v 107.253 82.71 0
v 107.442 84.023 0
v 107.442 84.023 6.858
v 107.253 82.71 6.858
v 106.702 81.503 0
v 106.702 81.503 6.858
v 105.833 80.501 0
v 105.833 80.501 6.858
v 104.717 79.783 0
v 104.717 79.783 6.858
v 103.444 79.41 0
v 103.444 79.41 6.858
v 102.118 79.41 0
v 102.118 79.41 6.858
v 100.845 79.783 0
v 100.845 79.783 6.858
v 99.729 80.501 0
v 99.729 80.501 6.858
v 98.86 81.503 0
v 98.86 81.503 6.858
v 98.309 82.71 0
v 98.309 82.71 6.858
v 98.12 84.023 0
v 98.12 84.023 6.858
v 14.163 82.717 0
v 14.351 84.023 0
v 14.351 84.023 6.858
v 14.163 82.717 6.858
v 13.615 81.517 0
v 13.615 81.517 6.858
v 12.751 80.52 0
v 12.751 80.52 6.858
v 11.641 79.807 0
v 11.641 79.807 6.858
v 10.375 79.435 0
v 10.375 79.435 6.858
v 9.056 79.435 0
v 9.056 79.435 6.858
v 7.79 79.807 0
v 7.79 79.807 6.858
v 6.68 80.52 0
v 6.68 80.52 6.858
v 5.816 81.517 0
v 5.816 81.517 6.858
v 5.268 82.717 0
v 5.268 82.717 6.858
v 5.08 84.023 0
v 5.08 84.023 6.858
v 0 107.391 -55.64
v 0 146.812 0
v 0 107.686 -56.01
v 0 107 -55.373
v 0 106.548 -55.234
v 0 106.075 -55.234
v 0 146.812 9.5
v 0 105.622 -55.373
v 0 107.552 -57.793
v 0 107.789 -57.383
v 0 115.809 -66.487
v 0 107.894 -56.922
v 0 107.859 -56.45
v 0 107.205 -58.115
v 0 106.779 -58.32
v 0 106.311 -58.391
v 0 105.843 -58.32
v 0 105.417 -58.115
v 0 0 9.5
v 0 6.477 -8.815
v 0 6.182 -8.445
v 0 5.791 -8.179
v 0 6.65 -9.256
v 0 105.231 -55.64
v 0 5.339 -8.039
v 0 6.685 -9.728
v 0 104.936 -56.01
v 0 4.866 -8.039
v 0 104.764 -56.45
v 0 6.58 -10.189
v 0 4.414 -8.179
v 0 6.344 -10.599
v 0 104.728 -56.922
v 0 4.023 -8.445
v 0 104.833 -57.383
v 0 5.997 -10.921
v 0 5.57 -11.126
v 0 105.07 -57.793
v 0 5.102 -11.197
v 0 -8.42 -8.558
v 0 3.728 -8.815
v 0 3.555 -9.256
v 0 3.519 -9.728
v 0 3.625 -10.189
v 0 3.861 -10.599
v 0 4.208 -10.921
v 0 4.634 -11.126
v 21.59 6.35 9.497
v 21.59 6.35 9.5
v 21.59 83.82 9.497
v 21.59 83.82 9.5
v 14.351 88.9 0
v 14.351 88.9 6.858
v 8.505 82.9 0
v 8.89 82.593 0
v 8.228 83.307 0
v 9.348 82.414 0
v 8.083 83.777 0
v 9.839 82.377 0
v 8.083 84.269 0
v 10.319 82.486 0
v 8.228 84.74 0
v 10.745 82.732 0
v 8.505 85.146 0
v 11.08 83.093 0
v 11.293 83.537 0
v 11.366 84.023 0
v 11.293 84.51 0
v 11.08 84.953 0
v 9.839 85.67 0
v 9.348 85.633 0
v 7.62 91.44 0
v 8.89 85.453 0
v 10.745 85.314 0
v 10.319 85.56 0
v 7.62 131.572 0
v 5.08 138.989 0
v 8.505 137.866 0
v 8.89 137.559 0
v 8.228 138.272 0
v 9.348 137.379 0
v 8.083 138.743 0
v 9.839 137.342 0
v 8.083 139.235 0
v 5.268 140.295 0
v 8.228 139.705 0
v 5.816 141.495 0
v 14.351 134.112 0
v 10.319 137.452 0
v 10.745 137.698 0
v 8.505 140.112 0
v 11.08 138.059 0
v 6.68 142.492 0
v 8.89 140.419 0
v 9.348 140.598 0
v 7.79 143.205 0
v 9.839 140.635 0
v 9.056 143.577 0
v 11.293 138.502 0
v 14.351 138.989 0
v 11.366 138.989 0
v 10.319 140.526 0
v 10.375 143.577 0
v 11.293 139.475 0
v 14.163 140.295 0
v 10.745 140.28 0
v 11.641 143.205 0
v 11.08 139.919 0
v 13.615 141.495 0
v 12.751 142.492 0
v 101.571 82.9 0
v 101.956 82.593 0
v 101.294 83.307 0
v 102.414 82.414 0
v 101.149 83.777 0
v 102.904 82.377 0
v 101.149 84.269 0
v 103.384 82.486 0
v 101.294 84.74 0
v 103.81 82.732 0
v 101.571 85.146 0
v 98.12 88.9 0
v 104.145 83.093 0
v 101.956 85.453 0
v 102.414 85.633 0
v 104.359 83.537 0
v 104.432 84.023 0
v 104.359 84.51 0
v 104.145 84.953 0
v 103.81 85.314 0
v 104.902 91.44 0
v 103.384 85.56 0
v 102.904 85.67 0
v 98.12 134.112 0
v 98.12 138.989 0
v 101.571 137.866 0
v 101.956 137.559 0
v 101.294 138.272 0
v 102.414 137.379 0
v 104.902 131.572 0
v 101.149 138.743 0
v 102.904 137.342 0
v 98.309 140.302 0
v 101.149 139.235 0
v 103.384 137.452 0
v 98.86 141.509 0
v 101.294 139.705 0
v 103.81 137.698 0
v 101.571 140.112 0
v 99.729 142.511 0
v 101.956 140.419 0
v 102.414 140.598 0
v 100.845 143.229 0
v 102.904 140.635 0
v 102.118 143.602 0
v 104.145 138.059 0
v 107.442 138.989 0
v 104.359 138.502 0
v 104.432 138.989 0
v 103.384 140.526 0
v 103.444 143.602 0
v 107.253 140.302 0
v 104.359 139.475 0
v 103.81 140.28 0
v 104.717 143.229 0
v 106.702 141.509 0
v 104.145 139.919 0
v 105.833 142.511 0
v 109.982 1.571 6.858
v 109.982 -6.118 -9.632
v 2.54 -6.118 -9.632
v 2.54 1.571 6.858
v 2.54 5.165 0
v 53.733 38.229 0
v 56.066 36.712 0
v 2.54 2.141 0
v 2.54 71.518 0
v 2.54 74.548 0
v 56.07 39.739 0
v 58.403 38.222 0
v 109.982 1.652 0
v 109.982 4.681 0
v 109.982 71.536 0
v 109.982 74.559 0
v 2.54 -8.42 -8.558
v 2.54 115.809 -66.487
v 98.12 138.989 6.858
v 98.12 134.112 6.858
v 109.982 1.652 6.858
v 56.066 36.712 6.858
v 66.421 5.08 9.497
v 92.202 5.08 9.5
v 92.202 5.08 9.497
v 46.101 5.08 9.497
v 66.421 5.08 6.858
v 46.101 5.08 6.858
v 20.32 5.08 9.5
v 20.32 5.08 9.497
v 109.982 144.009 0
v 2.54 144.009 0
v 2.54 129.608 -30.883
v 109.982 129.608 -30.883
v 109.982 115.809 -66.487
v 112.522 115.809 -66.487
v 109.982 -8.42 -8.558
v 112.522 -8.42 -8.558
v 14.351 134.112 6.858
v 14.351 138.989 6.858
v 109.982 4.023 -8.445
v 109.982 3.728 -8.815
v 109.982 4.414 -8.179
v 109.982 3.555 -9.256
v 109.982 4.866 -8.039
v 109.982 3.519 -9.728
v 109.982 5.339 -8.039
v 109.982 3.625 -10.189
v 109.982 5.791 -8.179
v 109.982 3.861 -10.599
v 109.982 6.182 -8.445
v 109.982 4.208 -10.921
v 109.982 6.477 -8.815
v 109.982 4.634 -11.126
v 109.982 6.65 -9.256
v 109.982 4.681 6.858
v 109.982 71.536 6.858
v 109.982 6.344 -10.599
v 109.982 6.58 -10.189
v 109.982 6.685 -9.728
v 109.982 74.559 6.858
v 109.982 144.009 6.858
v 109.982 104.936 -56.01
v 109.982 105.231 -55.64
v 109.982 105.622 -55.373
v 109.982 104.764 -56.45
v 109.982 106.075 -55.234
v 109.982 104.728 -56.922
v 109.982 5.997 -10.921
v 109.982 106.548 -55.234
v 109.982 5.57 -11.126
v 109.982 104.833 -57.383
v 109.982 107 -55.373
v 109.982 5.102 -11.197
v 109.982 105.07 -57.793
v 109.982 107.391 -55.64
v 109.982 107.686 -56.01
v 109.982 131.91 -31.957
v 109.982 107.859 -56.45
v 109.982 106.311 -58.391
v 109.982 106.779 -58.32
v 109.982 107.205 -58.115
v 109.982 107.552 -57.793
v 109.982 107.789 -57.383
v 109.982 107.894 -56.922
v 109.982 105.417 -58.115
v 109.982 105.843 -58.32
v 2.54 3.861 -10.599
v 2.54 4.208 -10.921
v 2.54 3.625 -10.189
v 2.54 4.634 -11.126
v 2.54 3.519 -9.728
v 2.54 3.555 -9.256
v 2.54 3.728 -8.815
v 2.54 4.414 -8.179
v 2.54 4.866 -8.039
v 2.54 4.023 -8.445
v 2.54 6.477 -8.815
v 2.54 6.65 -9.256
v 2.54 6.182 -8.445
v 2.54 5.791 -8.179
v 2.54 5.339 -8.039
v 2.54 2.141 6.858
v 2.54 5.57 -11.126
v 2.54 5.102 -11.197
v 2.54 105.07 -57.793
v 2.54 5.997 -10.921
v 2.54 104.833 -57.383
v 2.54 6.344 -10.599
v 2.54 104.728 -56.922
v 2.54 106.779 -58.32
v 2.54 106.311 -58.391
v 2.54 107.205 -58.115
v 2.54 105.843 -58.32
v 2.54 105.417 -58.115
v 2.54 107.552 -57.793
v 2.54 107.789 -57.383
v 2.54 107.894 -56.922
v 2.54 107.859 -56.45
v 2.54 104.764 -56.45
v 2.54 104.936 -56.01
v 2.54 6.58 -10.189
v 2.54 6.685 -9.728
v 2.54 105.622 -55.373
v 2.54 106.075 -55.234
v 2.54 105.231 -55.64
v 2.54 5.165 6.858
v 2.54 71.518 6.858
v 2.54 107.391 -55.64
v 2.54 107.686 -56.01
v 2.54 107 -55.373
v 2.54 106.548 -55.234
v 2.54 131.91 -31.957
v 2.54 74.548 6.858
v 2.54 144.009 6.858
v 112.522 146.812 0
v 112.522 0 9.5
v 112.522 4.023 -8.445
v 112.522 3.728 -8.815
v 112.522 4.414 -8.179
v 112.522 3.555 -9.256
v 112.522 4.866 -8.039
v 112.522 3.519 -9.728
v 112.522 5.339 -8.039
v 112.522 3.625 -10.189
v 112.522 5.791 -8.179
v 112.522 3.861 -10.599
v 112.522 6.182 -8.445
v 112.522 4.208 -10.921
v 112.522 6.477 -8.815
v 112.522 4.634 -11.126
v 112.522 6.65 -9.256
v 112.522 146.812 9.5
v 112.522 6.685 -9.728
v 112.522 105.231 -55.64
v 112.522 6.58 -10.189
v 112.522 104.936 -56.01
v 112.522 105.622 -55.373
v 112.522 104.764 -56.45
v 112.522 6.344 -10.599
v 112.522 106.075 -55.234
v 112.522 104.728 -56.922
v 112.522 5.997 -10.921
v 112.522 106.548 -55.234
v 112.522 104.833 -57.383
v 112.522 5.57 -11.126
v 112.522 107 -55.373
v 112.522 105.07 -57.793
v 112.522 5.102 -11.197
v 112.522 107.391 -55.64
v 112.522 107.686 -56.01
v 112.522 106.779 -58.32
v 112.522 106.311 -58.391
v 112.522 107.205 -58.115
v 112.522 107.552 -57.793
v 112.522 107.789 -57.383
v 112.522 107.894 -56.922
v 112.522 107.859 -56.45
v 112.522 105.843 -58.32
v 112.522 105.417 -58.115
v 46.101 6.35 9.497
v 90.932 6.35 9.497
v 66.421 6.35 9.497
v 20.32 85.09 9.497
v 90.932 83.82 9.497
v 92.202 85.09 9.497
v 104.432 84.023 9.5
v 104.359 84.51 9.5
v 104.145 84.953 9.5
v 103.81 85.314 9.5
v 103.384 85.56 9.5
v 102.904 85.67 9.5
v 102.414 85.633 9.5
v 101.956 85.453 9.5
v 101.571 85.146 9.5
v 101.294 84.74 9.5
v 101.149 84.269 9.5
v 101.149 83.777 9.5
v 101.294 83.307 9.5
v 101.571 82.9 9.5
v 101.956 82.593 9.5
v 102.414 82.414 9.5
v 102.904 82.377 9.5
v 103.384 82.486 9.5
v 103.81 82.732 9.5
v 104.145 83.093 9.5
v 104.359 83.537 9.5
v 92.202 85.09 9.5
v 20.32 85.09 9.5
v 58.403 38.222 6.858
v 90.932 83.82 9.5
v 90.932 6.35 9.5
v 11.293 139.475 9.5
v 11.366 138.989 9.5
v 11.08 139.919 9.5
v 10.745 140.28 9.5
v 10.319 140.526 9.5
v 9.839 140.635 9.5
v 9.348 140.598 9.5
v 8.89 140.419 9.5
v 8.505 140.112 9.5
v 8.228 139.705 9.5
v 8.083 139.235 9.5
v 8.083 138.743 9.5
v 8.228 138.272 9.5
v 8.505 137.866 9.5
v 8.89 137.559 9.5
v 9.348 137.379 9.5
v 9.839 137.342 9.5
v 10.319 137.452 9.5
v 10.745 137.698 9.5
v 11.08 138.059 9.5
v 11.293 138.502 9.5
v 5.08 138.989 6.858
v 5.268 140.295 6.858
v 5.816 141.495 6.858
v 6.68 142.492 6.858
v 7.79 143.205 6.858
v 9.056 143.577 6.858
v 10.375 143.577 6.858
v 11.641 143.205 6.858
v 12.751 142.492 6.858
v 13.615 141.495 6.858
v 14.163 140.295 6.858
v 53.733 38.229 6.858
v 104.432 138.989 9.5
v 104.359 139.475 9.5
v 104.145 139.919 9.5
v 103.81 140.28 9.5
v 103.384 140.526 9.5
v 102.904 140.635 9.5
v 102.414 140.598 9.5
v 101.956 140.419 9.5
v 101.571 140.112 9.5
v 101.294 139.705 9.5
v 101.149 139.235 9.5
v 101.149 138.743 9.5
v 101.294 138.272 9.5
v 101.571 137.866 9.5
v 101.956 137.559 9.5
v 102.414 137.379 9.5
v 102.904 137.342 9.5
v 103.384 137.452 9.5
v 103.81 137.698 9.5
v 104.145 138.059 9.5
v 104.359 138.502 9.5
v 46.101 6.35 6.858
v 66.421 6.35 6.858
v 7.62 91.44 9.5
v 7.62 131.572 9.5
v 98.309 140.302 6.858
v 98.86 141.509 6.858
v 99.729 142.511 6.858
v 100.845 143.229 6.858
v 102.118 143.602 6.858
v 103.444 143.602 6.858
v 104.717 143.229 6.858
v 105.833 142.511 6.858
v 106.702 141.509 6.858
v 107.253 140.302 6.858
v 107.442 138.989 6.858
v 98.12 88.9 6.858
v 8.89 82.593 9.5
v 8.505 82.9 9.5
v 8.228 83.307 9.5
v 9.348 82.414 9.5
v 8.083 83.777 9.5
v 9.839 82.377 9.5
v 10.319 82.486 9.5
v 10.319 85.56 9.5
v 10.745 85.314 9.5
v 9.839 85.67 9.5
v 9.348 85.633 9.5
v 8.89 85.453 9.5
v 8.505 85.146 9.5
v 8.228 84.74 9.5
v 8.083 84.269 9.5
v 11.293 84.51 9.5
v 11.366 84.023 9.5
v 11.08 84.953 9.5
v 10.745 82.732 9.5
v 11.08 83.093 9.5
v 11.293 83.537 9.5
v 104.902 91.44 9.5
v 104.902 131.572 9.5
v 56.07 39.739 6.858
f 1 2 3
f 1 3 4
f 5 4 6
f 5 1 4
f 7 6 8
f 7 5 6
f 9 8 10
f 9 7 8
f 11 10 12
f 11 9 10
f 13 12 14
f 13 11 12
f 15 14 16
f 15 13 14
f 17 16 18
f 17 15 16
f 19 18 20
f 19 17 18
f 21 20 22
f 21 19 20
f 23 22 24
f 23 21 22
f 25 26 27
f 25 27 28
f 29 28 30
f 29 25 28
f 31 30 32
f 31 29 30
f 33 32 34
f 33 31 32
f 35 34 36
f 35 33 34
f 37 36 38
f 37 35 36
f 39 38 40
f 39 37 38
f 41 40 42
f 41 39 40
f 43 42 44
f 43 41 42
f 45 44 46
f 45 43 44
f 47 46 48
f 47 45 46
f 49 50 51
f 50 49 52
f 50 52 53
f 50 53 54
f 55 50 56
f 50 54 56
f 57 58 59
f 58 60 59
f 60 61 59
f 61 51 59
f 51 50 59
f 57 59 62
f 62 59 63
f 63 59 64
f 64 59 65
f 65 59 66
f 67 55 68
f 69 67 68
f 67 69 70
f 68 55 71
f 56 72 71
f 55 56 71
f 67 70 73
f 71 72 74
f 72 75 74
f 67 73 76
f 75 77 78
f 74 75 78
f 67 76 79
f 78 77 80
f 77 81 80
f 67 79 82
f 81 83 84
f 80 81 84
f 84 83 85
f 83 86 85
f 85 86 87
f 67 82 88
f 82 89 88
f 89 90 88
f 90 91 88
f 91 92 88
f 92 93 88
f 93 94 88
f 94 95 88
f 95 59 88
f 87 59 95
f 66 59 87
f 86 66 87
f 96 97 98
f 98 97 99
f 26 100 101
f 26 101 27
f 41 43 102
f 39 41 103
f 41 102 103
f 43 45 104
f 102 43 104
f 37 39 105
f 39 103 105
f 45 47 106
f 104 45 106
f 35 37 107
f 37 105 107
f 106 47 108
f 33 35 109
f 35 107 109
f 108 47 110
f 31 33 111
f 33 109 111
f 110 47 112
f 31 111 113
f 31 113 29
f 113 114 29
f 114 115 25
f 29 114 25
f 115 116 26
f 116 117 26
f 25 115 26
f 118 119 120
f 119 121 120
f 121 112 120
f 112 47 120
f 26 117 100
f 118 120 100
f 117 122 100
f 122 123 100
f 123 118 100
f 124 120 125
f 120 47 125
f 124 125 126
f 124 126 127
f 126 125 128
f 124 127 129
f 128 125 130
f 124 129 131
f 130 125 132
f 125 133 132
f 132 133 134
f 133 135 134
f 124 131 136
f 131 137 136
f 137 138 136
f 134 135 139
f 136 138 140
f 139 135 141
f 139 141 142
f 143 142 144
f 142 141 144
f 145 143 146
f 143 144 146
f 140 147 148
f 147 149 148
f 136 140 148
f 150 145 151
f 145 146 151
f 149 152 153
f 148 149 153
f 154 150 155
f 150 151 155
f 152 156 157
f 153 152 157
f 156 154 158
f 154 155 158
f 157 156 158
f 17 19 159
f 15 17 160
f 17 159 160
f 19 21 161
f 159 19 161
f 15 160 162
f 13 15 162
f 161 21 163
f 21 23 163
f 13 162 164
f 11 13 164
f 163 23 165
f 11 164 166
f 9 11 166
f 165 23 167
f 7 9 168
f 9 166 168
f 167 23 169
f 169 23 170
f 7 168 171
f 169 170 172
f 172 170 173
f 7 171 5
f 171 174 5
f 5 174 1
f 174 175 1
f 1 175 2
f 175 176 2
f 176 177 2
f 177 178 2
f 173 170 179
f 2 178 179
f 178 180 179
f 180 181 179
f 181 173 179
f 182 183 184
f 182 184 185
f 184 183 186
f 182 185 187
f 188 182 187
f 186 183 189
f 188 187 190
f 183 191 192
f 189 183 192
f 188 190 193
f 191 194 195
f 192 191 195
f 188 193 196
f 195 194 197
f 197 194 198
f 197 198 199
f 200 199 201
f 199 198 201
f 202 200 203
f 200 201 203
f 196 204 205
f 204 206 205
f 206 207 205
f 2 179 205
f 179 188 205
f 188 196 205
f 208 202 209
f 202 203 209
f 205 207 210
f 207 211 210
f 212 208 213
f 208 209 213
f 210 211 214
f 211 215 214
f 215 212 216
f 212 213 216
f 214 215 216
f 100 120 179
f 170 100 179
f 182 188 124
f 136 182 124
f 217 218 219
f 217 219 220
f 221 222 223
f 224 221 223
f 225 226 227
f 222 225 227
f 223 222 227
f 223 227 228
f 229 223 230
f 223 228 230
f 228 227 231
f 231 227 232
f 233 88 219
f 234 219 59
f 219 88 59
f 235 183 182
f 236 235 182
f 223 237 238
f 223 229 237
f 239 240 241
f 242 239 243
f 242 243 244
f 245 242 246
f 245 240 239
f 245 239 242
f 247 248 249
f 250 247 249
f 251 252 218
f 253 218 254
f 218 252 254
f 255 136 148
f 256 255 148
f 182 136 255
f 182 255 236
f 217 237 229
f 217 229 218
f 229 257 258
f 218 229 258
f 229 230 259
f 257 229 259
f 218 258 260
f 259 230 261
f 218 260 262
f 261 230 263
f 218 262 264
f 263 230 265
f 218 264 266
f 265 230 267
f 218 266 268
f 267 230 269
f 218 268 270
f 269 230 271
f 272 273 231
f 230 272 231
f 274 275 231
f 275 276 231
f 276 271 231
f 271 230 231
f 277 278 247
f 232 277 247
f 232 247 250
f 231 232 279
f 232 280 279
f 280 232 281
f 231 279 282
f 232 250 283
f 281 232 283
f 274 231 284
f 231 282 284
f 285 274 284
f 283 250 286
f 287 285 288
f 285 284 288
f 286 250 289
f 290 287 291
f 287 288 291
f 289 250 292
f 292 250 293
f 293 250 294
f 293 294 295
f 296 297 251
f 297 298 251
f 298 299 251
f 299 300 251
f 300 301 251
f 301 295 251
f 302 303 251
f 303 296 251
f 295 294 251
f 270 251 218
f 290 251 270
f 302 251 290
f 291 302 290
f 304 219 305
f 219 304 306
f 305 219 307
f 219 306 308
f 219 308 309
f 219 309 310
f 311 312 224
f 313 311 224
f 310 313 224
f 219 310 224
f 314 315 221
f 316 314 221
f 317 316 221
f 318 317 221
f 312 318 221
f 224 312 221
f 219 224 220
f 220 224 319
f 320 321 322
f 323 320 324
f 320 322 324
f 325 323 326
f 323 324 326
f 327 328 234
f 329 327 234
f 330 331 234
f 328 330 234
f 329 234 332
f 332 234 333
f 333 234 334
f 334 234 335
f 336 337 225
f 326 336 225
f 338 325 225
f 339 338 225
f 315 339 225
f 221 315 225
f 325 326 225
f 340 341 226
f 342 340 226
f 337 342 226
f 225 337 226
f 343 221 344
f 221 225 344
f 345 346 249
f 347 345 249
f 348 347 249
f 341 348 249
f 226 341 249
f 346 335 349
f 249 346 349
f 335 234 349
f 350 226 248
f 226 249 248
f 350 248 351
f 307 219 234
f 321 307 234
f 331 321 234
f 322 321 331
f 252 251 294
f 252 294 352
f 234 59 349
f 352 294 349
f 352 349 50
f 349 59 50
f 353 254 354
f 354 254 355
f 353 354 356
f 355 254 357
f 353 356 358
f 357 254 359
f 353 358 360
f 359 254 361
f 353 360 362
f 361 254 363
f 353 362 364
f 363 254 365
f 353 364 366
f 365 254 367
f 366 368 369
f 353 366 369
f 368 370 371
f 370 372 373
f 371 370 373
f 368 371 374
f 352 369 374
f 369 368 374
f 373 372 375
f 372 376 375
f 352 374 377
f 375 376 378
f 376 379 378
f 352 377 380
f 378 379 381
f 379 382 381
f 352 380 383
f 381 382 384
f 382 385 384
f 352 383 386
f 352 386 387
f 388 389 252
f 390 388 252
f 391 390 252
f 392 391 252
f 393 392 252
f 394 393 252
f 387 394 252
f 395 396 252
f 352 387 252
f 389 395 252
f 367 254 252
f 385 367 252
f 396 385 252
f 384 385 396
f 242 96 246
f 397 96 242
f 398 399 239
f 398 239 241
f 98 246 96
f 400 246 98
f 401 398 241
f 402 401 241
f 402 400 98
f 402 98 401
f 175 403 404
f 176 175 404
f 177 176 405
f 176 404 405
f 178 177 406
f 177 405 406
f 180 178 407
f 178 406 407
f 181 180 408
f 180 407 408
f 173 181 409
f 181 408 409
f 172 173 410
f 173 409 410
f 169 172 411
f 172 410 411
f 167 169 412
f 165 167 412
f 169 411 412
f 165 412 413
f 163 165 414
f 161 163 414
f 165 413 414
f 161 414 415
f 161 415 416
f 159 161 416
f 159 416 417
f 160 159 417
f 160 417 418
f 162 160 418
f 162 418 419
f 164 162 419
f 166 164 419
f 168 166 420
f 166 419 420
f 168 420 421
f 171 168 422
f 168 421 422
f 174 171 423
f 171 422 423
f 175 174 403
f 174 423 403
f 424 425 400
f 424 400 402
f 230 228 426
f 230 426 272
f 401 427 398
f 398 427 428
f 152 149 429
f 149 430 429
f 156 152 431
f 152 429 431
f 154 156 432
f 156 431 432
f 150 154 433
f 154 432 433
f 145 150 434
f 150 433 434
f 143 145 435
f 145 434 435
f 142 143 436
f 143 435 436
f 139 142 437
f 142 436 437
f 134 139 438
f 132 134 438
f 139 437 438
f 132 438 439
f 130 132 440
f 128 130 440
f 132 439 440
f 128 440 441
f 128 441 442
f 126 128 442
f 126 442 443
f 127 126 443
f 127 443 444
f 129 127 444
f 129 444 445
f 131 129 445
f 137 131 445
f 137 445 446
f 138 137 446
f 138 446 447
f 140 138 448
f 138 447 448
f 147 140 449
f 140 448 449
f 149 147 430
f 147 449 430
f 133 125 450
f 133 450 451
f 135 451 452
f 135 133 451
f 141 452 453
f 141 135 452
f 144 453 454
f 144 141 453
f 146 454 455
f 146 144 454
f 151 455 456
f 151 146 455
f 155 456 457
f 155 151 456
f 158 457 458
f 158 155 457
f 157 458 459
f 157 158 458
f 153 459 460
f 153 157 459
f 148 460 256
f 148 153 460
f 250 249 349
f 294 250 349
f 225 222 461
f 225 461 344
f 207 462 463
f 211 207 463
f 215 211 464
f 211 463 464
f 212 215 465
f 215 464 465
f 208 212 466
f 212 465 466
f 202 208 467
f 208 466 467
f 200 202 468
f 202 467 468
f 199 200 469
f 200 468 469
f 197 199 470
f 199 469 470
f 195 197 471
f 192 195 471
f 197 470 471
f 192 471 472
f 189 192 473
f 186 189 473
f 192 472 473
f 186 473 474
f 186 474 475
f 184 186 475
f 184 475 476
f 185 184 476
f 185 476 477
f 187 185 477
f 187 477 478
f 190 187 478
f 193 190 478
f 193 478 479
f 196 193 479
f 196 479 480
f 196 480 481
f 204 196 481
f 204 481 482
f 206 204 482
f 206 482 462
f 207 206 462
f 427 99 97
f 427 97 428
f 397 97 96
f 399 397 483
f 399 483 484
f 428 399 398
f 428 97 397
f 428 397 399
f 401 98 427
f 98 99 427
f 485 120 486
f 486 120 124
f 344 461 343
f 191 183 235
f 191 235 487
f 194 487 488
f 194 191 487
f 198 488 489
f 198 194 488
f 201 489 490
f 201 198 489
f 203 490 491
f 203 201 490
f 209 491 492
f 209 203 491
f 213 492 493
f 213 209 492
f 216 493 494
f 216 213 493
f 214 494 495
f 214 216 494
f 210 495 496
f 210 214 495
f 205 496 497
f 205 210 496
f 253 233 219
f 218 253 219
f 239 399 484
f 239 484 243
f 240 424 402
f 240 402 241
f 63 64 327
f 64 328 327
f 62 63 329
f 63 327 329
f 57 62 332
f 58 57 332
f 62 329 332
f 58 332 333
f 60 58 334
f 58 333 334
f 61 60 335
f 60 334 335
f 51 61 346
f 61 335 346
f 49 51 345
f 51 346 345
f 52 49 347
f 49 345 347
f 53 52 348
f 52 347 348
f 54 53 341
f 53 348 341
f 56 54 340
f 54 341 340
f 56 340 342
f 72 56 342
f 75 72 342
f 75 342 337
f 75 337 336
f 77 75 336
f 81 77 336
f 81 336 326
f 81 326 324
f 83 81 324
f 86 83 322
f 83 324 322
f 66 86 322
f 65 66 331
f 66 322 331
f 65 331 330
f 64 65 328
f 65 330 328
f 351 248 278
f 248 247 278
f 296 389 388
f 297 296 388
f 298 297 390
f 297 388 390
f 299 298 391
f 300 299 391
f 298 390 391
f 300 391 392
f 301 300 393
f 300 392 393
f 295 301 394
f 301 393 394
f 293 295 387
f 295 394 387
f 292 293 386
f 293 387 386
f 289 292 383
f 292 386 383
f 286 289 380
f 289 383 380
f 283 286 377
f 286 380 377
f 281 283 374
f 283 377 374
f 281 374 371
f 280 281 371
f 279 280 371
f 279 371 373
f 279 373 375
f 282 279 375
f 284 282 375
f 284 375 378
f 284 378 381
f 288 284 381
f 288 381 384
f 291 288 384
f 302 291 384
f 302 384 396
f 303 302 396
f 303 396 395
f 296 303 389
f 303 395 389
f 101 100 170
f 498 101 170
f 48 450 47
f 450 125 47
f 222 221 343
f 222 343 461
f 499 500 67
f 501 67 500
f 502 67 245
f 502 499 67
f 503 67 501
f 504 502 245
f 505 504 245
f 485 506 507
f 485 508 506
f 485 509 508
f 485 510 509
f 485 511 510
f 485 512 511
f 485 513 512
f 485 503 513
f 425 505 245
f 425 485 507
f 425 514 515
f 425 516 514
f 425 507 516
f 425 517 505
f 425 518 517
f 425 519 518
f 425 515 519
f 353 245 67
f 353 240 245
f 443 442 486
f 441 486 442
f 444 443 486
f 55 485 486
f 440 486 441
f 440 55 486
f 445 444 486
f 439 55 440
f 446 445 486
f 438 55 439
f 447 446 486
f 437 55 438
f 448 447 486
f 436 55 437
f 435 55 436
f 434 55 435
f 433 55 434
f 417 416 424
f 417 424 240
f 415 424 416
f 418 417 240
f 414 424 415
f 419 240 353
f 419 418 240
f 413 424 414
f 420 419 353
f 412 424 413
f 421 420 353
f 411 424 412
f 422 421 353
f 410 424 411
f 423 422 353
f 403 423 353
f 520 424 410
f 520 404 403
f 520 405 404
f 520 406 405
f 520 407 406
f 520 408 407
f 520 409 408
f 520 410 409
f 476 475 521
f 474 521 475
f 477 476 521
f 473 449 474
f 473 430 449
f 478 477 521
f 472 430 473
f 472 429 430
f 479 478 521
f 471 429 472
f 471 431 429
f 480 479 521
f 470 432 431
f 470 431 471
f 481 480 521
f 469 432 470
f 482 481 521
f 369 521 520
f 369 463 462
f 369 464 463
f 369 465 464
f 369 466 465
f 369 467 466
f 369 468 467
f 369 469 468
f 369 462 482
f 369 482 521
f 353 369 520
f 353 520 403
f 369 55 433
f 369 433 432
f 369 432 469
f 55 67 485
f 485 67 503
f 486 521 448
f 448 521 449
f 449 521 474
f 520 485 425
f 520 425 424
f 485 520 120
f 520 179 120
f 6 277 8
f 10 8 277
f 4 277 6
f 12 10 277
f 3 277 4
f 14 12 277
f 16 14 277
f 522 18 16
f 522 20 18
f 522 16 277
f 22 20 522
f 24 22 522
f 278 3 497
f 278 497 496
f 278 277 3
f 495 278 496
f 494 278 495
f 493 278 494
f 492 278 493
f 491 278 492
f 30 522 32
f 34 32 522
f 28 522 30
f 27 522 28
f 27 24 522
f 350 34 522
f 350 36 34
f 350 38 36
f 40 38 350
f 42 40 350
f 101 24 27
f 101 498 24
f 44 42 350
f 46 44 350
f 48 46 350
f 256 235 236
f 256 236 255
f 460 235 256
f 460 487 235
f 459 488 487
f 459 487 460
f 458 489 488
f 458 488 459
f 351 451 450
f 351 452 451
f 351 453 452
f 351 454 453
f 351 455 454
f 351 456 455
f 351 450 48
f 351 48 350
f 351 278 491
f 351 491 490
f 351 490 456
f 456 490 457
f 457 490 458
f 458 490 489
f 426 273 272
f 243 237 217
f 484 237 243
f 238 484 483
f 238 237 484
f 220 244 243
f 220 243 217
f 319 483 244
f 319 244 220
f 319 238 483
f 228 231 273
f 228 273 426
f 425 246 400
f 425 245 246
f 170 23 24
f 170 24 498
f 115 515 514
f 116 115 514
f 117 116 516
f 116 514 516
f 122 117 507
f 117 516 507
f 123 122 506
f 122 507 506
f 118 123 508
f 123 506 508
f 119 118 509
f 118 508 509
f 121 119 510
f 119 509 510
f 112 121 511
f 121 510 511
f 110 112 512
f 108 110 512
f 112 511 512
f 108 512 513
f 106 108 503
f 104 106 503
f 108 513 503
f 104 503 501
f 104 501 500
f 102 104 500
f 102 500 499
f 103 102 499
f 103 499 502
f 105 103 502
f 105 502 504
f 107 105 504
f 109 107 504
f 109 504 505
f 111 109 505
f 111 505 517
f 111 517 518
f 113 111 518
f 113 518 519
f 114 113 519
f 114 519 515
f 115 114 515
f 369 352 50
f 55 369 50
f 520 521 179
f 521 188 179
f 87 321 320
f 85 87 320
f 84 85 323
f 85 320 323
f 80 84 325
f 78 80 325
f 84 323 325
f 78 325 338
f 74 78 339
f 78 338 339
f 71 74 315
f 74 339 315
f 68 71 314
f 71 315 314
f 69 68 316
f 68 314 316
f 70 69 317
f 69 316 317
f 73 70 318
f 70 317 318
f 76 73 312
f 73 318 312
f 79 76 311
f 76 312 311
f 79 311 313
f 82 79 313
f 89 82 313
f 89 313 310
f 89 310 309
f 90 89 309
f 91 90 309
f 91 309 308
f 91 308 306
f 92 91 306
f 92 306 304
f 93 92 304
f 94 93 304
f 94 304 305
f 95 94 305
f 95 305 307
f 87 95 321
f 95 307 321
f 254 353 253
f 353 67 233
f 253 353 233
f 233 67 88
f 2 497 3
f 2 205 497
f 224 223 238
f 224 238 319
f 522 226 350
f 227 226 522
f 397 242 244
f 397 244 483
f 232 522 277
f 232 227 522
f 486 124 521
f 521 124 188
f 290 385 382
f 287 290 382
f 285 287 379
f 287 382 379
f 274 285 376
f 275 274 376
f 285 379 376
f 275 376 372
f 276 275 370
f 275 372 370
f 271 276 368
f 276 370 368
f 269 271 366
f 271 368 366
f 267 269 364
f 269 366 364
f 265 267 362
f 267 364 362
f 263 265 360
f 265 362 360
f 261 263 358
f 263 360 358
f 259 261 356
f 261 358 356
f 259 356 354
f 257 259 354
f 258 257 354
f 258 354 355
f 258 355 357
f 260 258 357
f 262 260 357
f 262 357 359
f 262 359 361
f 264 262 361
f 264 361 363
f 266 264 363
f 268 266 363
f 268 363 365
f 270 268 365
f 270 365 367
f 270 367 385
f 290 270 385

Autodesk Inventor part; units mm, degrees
ref_plane "YZ Plane" through (0, 0, 0) normal (1, 0, 0) x (0, 1, 0)
ref_plane "XZ Plane" through (0, 0, 0) normal (0, 1, 0) x (-1, 0, 0)
ref_plane "XY Plane" through (0, 0, 0) normal (0, 0, 1) x (1, 0, 0)
sketch "Sketch1" plane through (0, 0, 0) normal (0, 0, 1) x (1, 0, 0)
  line L0 (0, 0) -> (112.522, 0)
  line L1 (112.522, 0) -> (112.522, 146.812)
  line L2 (112.522, 146.812) -> (0, 146.812)
  line L3 (0, 146.812) -> (0, 0)
  line L4 (7.62, 131.572) -> (104.902, 131.572)
  line L5 (104.902, 131.572) -> (104.902, 91.44)
  line L6 (104.902, 91.44) -> (7.62, 91.44)
  line L7 (7.62, 91.44) -> (7.62, 131.572)
  line L8 (21.59, 83.82) -> (90.932, 83.82)
  line L9 (90.932, 83.82) -> (90.932, 6.35)
  line L10 (90.932, 6.35) -> (21.59, 6.35)
  line L11 (21.59, 6.35) -> (21.59, 83.82)
  dimension "d0" = 97.282
  dimension "d1" = 40.132
  dimension "d2" = 69.342
  dimension "d3" = 77.47
  dimension "d4" = 6.35
  dimension "d5" = 21.59
  dimension "d6" = 7.62
  dimension "d7" = 7.62
  dimension "d8" = 15.24
  dimension "d9" = 7.62
extrude "Extrusion1" add sketch "Sketch1" along normal blind 9.4996 contours L3 L2 L1 L0 | L8 L9 L10 L11
sketch "Sketch2" plane through (0, 0, 9.4996) normal (0, 0, 1) x (1, 0, 0)
  line L0 (0, 0) -> (112.522, 0)
  line L1 (112.522, 0) -> (112.522, 139.192)
  line L2 (112.522, 139.192) -> (0, 139.192)
  line L3 (0, 139.192) -> (0, 0)
  line L4 (7.62, 131.572) -> (104.902, 131.572)
  line L5 (104.902, 131.572) -> (104.902, 91.44)
  line L6 (104.902, 91.44) -> (7.62, 91.44)
  line L7 (7.62, 91.44) -> (7.62, 131.572)
  line L8 (21.59, 83.82) -> (90.932, 83.82)
  line L9 (90.932, 83.82) -> (90.932, 6.35)
  line L10 (90.932, 6.35) -> (21.59, 6.35)
  line L11 (21.59, 6.35) -> (21.59, 83.82)
  line L12 (20.32, 85.09) -> (92.202, 85.09)
  line L13 (92.202, 85.09) -> (92.202, 5.08)
  line L14 (92.202, 5.08) -> (20.32, 5.08)
  line L15 (20.32, 5.08) -> (20.32, 85.09)
  dimension "d12" = 97.282
  dimension "d13" = 40.132
  dimension "d14" = 69.342
  dimension "d15" = 77.47
  dimension "d16" = 6.35
  dimension "d17" = 21.59
  dimension "d18" = 7.62
  dimension "d19" = 7.62
  dimension "d20" = 7.62
  dimension "d21" = 7.62
  dimension "d33" = 1.27
  dimension "d34" = 1.27
  dimension "d35" = 1.27
  dimension "d36" = 1.27
extrude "Extrusion2" cut sketch "Sketch2" against normal blind 0.0025 contours L12 L13 L14 L15
sketch "Sketch3" plane through (0, 0, 9.4996) normal (0, 0, 1) x (1, 0, 0)
  circle A0 centre (9.7155, 138.9888) radius 1.651
  circle A1 centre (102.7811, 138.9888) radius 1.651
  circle A2 centre (102.7811, 84.0232) radius 1.651
  circle A3 centre (9.7155, 84.0232) radius 1.651
  line L0 (104.902, 131.572) -> (104.902, 91.44)
  line L1 (104.902, 91.44) -> (7.62, 91.44)
  line L2 (21.59, 6.35) -> (90.932, 6.35)
  line L3 (92.202, 5.08) -> (20.32, 5.08)
  line L4 (46.101, 6.35) -> (66.421, 6.35)
  line L5 (66.421, 6.35) -> (66.421, 5.08)
  line L6 (66.421, 5.08) -> (46.101, 5.08)
  line L7 (46.101, 5.08) -> (46.101, 6.35)
  line L8 (21.59, 83.82) -> (21.59, 6.35)
  line L9 (90.932, 6.35) -> (90.932, 83.82)
  point P0 (0, 0)
  dimension "d24" = 3.302
  dimension "d25" = 93.0656
  dimension "d26" = 93.0656
  dimension "d27" = 0
  dimension "d28" = 54.9656
  dimension "d29" = 2.1209
  dimension "d30" = 0
  dimension "d31" = 7.4168
  dimension "d32" = 0
  dimension "d37" = 20.32
  dimension "d38" = 24.511
  dimension "d39" = 24.511
extrude "Extrusion3" cut sketch "Sketch3" against normal through all
sketch "Sketch10" plane through (0, 0, 0) normal (0, 0, -1) x (-1, 0, 0)
  line L0 (12.7738, 184.0109) -> (-117.8029, 184.0109)
  line L1 (-117.8029, 184.0109) -> (-117.8029, -18.4511)
  line L2 (-117.8029, -18.4511) -> (12.7738, -18.4511)
  line L3 (12.7738, -18.4511) -> (12.7738, 184.0109)
  line L4 (-5.08, 138.9888) -> (-5.08, 84.0232)
  line L5 (-14.351, 134.112) -> (-98.1202, 134.112)
  line L6 (-107.442, 138.9888) -> (-107.442, 84.0232)
  line L7 (-112.522, 0) -> (-112.522, 146.812)
  line L8 (-14.351, 88.9) -> (-98.1202, 88.9)
  arc A0 (-5.08, 138.9888) -> (-14.351, 138.9888) centre (-9.7155, 138.9888) ccw
  arc A1 (-14.351, 84.0232) -> (-5.08, 84.0232) centre (-9.7155, 84.0232) ccw
  arc A2 (-107.442, 84.0232) -> (-98.1202, 84.0232) centre (-102.7811, 84.0232) ccw
  arc A3 (-98.1202, 138.9888) -> (-107.442, 138.9888) centre (-102.7811, 138.9888) ccw
  circle A4 centre (-9.7155, 84.0232) radius 1.651
  circle A5 centre (-9.7155, 138.9888) radius 1.651
  circle A6 centre (-102.7811, 138.9888) radius 1.651
  circle A7 centre (-102.7811, 84.0232) radius 1.651
  line L9 (-14.351, 134.112) -> (-14.351, 138.9888)
  line L10 (-98.1202, 138.9888) -> (-98.1202, 134.112)
  line L11 (-7.62, 131.572) -> (-7.62, 91.44)
  line L12 (-7.62, 131.572) -> (-104.902, 131.572)
  line L13 (-7.62, 91.44) -> (-104.902, 91.44)
  line L14 (-104.902, 131.572) -> (-104.902, 91.44)
  line L15 (-98.1202, 84.0232) -> (-98.1202, 88.9)
  line L16 (-14.351, 88.9) -> (-14.351, 84.0232)
  line L17 (0, 76.2) -> (-112.5015, 3.0431)
  line L18 (-112.5015, 3.0431) -> (-112.522, 0)
  line L19 (-112.522, 0) -> (1.3847, 74.0706)
  line L20 (1.3847, 74.0706) -> (0, 76.2)
  line L21 (1.524, 2.54) -> (-112.522, 76.2)
  line L22 (-112.522, 76.2) -> (-114.4017, 74.3903)
  line L23 (-114.4017, 74.3903) -> (0.1459, 0.4063)
  line L24 (0.1459, 0.4063) -> (1.524, 2.54)
  line L25 (0, 0) -> (-112.522, 0)
  line L26 (0, 146.812) -> (0, 0)
  point P0 (-14.351, 136.5504)
  dimension "d64" = 2.54
  dimension "d65" = 2.54
  dimension "d66" = 2.54
  dimension "d67" = 2.54
  dimension "d68" = 2.54
  dimension "d69" = 2.54
  dimension "d70" = 2.54
  dimension "d71" = 1.524
  dimension "d72" = 76.2
  dimension "d73" = 0
  dimension "d74" = 76.2
  dimension "d75" = 0
  dimension "d76" = 0
  dimension "d77" = 0
extrude "Extrusion8" cut sketch "Sketch10" against normal blind 6.858 contours L3 L2 L1 L0 | L7 L23 L17 L18 | L19 L23 L26 L25 | L19 L26 L21
sketch "Sketch5" plane through (112.522, 0, 9.4996) normal (1, 0, 0) x (0, 0, -1)
  line L0 (9.4996, 146.812) -> (0, 146.812)
  line L1 (9.4996, 146.812) -> (75.9867, 115.8086)
  line L2 (9.4996, 0) -> (0, 0)
  line L3 (18.0577, -8.4205) -> (0, 0)
  line L4 (0, 146.812) -> (0, 0)
  line L5 (0, 0) -> (0, 146.812)
  line L6 (0, 146.812) -> (9.4996, 146.812)
  line L7 (75.9867, 115.8086) -> (18.0577, -8.4205)
  line L8 (22.86, 146.812) -> (22.86, 73.406)
  line L9 (9.4996, 0) -> (9.4996, 146.812)
  point P0 (5.08, 0)
  point P1 (9.4996, 80.01)
  point P2 (22.86, 80.01)
  dimension "d45" = 25
  dimension "d47" = 22.86
  dimension "d48" = 33.02
extrude "Extrusion5" add sketch "Sketch5" against normal blind 2.54
ref_plane "Work Plane1" through (56.261, 0, 9.4996) normal (-1, 0, 0) x (0, 0, 1)
mirror "Mirror1" about plane through (56.261, 0, 9.4996) normal (-1, 0, 0) of "Extrusion5"
sketch "Sketch7" plane through (112.522, 0, 9.4996) normal (1, 0, 0) x (0, 0, -1)
  line L0 (18.0577, -8.4205) -> (0, 0)
  line L1 (0, 0) -> (18.0577, -8.4205)
  line L2 (18.0577, -8.4205) -> (19.1312, -6.1184)
  line L3 (75.9867, 115.8086) -> (18.0577, -8.4205)
  line L4 (0, 2.8026) -> (0, 0)
  line L5 (0.0025, 6.35) -> (0.0025, 83.82)
  line L6 (19.1312, -6.1184) -> (0, 2.8026)
  line L7 (9.4996, 146.812) -> (0, 146.812)
  line L8 (9.4996, 146.812) -> (9.4996, 144.0094)
  line L9 (9.4996, 146.812) -> (9.4996, 0)
  line L10 (9.4996, 144.0094) -> (40.3829, 129.6083)
  line L11 (40.3829, 129.6083) -> (41.4564, 131.9103)
  line L12 (9.4996, 146.812) -> (75.9867, 115.8086)
  line L13 (41.4564, 131.9103) -> (9.4996, 146.812)
  line L14 (0, 146.812) -> (9.4996, 146.812)
  line L15 (9.4996, 144.0094) -> (0, 144.0094)
  line L16 (0, 146.812) -> (0, 0)
  line L17 (0, 144.0094) -> (0, 146.812)
  point P0 (9.4996, 80.01)
  point P1 (2.6416, 146.812)
  dimension "d51" = 2.54
  dimension "d61" = 2.54
  dimension "d63" = 38.1
extrude "Extrusion6" add sketch "Sketch7" against normal through all contours L0 L4 L6 L2 | L16 L7 L8 L15 | L11 L10 L8 L12
sketch "Sketch8" plane through (112.522, 0, 9.4996) normal (1, 0, 0) x (0, 0, -1)
  circle A0 centre (19.1087, 5.1024) radius 1.5875
  circle A1 centre (66.3031, 106.3112) radius 1.5875
  line L0 (0, 0) -> (18.0577, -8.4205)
  line L1 (18.0577, -8.4205) -> (75.9867, 115.8086)
  line L2 (75.9867, 115.8086) -> (9.4996, 146.812)
  point P0 (9.4996, 0)
  dimension "d54" = 3.175
  dimension "d55" = 12.7
  dimension "d56" = 4.7625
  dimension "d57" = 4.7625
  dimension "d80" = 12.7
extrude "Extrusion7" cut sketch "Sketch8" against normal through all
properties part number "face"
